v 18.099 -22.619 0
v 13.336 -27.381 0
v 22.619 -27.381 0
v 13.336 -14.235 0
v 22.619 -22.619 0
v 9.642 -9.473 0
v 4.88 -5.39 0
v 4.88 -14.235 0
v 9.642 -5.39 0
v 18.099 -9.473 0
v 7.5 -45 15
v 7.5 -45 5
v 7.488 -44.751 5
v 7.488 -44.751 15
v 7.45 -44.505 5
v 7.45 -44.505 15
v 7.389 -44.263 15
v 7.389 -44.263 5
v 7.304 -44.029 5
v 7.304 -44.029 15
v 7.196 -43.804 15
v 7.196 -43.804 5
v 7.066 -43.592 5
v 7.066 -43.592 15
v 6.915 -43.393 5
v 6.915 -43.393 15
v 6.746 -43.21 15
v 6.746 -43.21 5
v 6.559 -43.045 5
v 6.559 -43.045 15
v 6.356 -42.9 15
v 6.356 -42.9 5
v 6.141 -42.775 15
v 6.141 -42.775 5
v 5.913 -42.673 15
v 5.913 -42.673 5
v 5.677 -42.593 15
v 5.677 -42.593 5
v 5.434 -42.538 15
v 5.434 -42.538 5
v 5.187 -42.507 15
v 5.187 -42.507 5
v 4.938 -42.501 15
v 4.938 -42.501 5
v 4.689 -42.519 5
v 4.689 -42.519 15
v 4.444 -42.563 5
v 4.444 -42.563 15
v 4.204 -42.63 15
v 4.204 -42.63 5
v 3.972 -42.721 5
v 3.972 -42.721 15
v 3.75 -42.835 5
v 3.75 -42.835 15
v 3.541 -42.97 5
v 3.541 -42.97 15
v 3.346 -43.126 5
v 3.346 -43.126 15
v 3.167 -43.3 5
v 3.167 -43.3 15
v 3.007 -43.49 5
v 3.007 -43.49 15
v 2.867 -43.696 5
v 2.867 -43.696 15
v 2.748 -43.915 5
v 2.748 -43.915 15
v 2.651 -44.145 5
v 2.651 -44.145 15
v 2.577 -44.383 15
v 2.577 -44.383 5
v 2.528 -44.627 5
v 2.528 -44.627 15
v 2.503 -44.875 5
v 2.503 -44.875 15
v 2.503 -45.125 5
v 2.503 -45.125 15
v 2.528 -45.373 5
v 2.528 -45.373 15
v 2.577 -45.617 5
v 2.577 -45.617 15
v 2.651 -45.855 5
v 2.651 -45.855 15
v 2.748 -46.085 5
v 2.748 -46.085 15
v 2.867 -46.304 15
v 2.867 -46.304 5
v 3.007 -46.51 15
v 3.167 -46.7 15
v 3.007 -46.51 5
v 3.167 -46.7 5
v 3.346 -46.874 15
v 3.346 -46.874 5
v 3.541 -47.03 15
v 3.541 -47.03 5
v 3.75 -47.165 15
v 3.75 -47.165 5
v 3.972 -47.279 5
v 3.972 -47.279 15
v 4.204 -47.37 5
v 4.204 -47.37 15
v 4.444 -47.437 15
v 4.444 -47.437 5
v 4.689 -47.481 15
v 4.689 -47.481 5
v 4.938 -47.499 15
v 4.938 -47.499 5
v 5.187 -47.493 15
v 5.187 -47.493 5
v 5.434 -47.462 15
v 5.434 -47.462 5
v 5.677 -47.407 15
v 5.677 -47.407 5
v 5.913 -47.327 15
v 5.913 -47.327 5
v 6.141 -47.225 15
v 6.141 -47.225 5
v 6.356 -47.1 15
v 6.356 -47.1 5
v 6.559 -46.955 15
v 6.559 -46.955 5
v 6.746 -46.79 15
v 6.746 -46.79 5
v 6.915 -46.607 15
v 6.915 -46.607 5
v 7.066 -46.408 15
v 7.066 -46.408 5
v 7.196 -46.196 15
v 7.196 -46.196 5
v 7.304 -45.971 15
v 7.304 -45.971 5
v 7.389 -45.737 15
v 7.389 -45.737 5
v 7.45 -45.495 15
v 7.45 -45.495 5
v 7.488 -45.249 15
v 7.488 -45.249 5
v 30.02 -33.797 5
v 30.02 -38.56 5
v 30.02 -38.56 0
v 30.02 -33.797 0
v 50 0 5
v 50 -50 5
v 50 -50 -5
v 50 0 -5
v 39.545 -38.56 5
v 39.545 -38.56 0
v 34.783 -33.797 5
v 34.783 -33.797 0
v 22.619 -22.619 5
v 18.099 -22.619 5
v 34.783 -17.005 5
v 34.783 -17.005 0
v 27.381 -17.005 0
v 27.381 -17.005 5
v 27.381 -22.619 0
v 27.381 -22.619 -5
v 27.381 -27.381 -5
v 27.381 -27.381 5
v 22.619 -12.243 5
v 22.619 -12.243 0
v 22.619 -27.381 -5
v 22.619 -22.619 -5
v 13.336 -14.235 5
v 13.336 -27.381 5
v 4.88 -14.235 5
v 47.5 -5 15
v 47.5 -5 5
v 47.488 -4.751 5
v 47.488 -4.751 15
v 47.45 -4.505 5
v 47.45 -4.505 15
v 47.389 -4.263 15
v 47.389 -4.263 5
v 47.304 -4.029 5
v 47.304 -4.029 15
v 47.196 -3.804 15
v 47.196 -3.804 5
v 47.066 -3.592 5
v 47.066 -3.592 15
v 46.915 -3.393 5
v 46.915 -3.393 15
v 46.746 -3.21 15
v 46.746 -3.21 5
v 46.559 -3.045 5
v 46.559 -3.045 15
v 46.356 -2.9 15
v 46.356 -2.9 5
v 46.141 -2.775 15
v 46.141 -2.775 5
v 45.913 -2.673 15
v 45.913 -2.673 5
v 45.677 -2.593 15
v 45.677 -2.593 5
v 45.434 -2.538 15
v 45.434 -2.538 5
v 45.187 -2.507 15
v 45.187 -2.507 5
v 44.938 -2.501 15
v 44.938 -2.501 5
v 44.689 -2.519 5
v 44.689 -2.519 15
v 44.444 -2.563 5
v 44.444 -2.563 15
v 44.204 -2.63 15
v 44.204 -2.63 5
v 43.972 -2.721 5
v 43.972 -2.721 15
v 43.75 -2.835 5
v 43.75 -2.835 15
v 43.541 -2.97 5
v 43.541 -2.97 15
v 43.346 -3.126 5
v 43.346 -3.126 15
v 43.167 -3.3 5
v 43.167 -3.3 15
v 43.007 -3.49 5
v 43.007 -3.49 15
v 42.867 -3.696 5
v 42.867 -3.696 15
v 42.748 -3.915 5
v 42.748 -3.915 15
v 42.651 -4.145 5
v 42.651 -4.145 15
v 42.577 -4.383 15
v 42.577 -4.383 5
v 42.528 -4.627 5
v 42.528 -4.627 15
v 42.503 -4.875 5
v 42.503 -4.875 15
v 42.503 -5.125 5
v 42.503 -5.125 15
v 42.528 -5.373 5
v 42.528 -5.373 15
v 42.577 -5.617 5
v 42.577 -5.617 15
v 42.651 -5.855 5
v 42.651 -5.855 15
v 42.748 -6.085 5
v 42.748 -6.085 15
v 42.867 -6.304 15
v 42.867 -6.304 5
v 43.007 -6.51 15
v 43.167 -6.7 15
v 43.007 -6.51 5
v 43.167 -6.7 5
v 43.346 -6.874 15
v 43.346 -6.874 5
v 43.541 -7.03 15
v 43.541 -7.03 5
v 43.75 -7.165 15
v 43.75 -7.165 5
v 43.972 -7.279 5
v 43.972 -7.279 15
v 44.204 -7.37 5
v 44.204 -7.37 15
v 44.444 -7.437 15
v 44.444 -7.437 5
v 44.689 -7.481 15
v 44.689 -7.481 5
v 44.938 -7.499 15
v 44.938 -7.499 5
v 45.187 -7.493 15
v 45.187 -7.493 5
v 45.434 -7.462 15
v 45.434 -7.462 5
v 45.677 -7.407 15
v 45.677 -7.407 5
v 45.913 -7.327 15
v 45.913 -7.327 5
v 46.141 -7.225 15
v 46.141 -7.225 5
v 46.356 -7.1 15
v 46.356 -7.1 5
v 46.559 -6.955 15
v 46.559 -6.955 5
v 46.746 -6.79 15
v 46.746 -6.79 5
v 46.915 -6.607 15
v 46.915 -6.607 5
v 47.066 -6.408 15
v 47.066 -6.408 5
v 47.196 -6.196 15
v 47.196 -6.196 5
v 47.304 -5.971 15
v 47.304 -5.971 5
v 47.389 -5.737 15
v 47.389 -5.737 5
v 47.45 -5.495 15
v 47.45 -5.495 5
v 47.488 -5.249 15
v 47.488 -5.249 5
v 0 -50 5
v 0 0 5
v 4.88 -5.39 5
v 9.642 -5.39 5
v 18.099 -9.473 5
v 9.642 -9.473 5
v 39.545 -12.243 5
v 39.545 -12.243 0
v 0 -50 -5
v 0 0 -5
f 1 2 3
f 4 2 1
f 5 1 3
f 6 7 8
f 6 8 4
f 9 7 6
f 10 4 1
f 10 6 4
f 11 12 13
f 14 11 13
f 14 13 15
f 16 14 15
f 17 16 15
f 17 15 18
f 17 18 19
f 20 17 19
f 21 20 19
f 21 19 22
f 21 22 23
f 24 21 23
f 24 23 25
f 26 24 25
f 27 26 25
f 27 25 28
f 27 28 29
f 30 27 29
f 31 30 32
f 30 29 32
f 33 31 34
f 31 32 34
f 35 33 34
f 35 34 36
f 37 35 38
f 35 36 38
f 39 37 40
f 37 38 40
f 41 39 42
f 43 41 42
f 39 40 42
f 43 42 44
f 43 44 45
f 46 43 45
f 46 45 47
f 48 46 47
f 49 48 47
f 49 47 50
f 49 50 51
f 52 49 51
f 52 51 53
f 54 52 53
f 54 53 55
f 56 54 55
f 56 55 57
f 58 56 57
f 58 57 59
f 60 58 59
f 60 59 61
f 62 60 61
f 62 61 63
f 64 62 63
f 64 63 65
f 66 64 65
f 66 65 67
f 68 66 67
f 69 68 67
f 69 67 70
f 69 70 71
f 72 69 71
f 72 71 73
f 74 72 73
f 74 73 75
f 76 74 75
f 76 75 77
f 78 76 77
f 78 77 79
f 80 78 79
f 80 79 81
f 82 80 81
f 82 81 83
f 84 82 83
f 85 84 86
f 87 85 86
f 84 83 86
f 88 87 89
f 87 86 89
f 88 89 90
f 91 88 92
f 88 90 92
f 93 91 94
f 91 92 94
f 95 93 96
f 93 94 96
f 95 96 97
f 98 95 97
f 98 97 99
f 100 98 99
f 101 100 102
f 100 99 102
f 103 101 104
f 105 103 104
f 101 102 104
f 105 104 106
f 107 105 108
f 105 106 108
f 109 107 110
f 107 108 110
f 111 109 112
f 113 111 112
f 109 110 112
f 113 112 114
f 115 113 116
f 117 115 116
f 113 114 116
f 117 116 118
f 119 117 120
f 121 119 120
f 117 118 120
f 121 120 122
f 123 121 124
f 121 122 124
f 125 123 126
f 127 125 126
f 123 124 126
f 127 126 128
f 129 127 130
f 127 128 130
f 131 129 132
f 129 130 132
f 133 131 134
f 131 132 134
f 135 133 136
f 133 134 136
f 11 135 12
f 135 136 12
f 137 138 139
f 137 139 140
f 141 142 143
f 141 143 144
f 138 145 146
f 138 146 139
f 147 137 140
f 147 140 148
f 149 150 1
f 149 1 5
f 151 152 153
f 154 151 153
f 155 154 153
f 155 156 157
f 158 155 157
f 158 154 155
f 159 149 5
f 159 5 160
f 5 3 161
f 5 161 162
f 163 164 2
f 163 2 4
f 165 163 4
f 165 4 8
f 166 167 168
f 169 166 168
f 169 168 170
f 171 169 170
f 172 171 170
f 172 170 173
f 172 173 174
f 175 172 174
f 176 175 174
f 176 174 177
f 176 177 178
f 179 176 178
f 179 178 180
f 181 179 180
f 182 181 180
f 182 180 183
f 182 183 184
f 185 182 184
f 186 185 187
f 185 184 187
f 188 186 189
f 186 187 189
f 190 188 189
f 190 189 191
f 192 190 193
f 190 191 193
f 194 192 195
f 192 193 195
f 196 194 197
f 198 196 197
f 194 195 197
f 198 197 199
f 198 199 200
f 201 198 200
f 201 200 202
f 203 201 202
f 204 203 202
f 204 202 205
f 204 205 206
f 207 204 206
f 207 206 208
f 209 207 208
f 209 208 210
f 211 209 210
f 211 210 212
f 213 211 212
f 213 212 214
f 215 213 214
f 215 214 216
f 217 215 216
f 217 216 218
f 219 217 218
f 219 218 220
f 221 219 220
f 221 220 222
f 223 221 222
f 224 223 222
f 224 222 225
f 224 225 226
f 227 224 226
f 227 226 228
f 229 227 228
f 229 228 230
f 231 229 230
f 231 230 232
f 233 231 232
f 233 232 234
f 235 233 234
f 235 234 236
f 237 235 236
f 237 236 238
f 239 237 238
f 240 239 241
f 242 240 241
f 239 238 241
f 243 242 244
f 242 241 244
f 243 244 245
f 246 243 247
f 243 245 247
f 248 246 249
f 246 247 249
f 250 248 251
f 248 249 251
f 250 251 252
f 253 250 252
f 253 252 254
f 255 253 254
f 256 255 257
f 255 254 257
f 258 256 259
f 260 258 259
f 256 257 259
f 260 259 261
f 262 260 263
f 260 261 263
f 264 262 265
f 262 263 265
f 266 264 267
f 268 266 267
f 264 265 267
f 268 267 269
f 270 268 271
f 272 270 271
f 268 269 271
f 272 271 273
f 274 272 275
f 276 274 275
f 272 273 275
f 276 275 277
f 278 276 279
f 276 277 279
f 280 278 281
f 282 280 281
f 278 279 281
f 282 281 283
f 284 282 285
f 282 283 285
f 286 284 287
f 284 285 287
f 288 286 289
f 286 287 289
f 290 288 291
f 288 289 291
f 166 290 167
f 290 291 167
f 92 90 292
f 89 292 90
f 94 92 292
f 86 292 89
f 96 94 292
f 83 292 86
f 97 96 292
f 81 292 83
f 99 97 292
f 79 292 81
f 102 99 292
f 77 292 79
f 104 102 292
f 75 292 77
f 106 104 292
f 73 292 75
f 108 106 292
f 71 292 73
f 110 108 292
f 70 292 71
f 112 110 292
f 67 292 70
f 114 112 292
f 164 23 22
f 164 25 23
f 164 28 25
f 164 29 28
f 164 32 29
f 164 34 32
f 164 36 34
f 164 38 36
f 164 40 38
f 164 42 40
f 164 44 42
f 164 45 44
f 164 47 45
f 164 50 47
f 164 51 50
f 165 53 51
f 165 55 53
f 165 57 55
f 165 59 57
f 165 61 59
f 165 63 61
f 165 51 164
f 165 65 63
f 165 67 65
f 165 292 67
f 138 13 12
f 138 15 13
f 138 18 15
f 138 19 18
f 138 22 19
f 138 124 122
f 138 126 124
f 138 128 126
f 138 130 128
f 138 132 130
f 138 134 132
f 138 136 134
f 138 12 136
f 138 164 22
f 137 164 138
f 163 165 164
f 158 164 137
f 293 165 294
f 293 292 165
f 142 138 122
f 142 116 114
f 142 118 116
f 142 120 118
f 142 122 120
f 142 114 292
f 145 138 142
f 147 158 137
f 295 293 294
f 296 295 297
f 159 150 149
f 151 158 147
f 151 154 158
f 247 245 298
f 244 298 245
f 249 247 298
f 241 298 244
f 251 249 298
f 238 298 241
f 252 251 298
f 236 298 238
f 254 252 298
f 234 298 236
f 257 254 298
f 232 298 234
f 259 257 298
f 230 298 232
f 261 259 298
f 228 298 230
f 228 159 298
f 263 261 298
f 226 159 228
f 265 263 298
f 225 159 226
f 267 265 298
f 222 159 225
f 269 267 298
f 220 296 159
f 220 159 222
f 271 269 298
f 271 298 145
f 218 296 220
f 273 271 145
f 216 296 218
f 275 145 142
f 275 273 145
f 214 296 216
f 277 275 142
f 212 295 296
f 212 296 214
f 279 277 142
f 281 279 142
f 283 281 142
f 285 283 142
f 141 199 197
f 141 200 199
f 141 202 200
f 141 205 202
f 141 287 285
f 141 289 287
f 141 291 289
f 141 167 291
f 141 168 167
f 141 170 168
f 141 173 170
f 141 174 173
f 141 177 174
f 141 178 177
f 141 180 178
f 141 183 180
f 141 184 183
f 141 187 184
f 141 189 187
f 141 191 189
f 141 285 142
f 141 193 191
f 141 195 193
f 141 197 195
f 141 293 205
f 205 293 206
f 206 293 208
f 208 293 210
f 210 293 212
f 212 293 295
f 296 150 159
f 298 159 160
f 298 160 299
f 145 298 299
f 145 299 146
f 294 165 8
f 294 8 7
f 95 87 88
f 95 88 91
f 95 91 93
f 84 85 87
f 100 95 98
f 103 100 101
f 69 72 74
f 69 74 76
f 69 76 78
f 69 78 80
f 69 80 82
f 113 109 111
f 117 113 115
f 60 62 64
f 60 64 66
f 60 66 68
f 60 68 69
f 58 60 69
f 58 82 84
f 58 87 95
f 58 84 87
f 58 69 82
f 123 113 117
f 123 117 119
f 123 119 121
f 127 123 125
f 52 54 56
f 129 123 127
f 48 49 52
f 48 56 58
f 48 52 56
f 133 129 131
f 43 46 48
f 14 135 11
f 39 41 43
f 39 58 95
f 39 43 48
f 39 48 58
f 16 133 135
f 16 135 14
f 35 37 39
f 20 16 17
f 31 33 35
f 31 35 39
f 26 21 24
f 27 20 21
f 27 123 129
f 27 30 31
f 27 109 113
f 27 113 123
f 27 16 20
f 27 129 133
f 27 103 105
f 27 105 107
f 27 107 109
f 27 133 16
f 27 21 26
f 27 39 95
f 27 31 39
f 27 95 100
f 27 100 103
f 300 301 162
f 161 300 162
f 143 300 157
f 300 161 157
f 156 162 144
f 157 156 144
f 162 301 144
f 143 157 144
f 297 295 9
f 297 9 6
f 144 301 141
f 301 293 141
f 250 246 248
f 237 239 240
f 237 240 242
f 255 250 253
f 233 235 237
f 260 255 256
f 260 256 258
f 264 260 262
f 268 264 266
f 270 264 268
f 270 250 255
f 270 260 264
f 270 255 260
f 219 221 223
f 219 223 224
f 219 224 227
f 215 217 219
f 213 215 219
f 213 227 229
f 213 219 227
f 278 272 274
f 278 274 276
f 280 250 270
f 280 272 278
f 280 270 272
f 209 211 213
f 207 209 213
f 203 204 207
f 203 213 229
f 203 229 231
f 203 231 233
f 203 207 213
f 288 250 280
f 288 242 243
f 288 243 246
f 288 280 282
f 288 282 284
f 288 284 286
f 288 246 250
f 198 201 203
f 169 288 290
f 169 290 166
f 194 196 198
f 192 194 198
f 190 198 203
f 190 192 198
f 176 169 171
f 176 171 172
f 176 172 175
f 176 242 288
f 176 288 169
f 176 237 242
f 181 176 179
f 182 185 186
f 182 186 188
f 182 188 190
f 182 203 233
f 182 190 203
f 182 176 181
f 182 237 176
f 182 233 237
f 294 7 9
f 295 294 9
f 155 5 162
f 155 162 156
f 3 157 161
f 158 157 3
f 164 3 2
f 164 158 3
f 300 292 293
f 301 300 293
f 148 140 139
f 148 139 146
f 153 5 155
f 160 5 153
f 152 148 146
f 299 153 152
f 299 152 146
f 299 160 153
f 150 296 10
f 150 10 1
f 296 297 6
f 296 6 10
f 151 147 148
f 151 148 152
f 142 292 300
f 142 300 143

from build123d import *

# Parameters (mm, degrees)
F0_W          = 50
F0_H          = 50
F0_R          = 2.5
F1_DEPTH      = 5
F0_W_2        = 4.7625
F0_H_2        = 4.7625
F2_DEPTH      = 2.38125
F3_DEPTH      = 5
F4_DEPTH      = 15
F4_DEPTH_BACK = 5


with BuildPart() as f1:
    # F0 (on Top) → F1 (new body, symmetric)
    with BuildSketch(Plane.XY):
        with Locations((25, -25)):
            Rectangle(F0_W, F0_H)
        with Locations((5, -45)):
            Circle(F0_R, mode=Mode.SUBTRACT)
        Polygon((18.098719, -22.61875), (22.61875, -22.61875), (22.61875, -12.242739), (39.545106, -12.242739), (39.545106, -17.005239), (39.545106, -38.55984), (34.782606, -38.55984), (30.020106, -38.55984), (30.020106, -33.79734), (34.782606, -33.79734), (34.782606, -17.005239), (27.38125, -17.005239), (27.38125, -22.61875), (27.38125, -25), (27.38125, -27.38125), (25, -27.38125), (22.61875, -27.38125), (18.098719, -27.38125), (13.336219, -27.38125), (13.336219, -14.235092), (4.879977, -14.235092), (4.879977, -9.472592), (4.879977, -5.390268), (9.642477, -5.390268), (9.642477, -9.472592), (13.336219, -9.472592), (18.098719, -9.472592), (18.098719, -14.235092), align=None, mode=Mode.SUBTRACT)
        with Locations((45, -5)):
            Circle(F0_R, mode=Mode.SUBTRACT)
    extrude(amount=F1_DEPTH, both=True)

    # F0 (on Top) → F2 (cut)
    with BuildSketch(Plane.XY):
        Polygon((22.61875, -27.38125), (22.61875, -25), (22.61875, -22.61875), (18.098719, -22.61875), (18.098719, -14.235092), (18.098719, -9.472592), (13.336219, -9.472592), (9.642477, -9.472592), (9.642477, -5.390268), (4.879977, -5.390268), (4.879977, -9.472592), (4.879977, -14.235092), (13.336219, -14.235092), (13.336219, -27.38125), (18.098719, -27.38125), align=None)
        Polygon((22.61875, -12.242739), (22.61875, -22.61875), (25, -22.61875), (27.38125, -22.61875), (27.38125, -17.005239), (34.782606, -17.005239), (34.782606, -33.79734), (34.782606, -38.55984), (39.545106, -38.55984), (39.545106, -17.005239), (39.545106, -12.242739), align=None)
        with Locations((32.401356, -36.17859)):
            Rectangle(F0_W_2, F0_H_2)
    extrude(amount=F2_DEPTH, mode=Mode.SUBTRACT)

    # F0 (on Top) → F3 (join)
    with BuildSketch(Plane.XY):
        Polygon((22.61875, -12.242739), (22.61875, -22.61875), (25, -22.61875), (27.38125, -22.61875), (27.38125, -17.005239), (34.782606, -17.005239), (34.782606, -33.79734), (34.782606, -38.55984), (39.545106, -38.55984), (39.545106, -17.005239), (39.545106, -12.242739), align=None)
        with Locations((32.401356, -36.17859)):
            Rectangle(F0_W_2, F0_H_2)
        Polygon((22.61875, -27.38125), (22.61875, -25), (22.61875, -22.61875), (18.098719, -22.61875), (18.098719, -14.235092), (18.098719, -9.472592), (13.336219, -9.472592), (9.642477, -9.472592), (9.642477, -5.390268), (4.879977, -5.390268), (4.879977, -9.472592), (4.879977, -14.235092), (13.336219, -14.235092), (13.336219, -27.38125), (18.098719, -27.38125), align=None)
    extrude(amount=-F3_DEPTH)

    # F0 (on Top) → F4 (join, two sides)
    with BuildSketch(Plane.XY) as f4_sk:
        with Locations((5, -45)):
            Circle(F0_R)
        with Locations((45, -5)):
            Circle(F0_R)
    extrude(amount=F4_DEPTH)
    extrude(f4_sk.sketch, amount=-F4_DEPTH_BACK)


solid = f1.part
